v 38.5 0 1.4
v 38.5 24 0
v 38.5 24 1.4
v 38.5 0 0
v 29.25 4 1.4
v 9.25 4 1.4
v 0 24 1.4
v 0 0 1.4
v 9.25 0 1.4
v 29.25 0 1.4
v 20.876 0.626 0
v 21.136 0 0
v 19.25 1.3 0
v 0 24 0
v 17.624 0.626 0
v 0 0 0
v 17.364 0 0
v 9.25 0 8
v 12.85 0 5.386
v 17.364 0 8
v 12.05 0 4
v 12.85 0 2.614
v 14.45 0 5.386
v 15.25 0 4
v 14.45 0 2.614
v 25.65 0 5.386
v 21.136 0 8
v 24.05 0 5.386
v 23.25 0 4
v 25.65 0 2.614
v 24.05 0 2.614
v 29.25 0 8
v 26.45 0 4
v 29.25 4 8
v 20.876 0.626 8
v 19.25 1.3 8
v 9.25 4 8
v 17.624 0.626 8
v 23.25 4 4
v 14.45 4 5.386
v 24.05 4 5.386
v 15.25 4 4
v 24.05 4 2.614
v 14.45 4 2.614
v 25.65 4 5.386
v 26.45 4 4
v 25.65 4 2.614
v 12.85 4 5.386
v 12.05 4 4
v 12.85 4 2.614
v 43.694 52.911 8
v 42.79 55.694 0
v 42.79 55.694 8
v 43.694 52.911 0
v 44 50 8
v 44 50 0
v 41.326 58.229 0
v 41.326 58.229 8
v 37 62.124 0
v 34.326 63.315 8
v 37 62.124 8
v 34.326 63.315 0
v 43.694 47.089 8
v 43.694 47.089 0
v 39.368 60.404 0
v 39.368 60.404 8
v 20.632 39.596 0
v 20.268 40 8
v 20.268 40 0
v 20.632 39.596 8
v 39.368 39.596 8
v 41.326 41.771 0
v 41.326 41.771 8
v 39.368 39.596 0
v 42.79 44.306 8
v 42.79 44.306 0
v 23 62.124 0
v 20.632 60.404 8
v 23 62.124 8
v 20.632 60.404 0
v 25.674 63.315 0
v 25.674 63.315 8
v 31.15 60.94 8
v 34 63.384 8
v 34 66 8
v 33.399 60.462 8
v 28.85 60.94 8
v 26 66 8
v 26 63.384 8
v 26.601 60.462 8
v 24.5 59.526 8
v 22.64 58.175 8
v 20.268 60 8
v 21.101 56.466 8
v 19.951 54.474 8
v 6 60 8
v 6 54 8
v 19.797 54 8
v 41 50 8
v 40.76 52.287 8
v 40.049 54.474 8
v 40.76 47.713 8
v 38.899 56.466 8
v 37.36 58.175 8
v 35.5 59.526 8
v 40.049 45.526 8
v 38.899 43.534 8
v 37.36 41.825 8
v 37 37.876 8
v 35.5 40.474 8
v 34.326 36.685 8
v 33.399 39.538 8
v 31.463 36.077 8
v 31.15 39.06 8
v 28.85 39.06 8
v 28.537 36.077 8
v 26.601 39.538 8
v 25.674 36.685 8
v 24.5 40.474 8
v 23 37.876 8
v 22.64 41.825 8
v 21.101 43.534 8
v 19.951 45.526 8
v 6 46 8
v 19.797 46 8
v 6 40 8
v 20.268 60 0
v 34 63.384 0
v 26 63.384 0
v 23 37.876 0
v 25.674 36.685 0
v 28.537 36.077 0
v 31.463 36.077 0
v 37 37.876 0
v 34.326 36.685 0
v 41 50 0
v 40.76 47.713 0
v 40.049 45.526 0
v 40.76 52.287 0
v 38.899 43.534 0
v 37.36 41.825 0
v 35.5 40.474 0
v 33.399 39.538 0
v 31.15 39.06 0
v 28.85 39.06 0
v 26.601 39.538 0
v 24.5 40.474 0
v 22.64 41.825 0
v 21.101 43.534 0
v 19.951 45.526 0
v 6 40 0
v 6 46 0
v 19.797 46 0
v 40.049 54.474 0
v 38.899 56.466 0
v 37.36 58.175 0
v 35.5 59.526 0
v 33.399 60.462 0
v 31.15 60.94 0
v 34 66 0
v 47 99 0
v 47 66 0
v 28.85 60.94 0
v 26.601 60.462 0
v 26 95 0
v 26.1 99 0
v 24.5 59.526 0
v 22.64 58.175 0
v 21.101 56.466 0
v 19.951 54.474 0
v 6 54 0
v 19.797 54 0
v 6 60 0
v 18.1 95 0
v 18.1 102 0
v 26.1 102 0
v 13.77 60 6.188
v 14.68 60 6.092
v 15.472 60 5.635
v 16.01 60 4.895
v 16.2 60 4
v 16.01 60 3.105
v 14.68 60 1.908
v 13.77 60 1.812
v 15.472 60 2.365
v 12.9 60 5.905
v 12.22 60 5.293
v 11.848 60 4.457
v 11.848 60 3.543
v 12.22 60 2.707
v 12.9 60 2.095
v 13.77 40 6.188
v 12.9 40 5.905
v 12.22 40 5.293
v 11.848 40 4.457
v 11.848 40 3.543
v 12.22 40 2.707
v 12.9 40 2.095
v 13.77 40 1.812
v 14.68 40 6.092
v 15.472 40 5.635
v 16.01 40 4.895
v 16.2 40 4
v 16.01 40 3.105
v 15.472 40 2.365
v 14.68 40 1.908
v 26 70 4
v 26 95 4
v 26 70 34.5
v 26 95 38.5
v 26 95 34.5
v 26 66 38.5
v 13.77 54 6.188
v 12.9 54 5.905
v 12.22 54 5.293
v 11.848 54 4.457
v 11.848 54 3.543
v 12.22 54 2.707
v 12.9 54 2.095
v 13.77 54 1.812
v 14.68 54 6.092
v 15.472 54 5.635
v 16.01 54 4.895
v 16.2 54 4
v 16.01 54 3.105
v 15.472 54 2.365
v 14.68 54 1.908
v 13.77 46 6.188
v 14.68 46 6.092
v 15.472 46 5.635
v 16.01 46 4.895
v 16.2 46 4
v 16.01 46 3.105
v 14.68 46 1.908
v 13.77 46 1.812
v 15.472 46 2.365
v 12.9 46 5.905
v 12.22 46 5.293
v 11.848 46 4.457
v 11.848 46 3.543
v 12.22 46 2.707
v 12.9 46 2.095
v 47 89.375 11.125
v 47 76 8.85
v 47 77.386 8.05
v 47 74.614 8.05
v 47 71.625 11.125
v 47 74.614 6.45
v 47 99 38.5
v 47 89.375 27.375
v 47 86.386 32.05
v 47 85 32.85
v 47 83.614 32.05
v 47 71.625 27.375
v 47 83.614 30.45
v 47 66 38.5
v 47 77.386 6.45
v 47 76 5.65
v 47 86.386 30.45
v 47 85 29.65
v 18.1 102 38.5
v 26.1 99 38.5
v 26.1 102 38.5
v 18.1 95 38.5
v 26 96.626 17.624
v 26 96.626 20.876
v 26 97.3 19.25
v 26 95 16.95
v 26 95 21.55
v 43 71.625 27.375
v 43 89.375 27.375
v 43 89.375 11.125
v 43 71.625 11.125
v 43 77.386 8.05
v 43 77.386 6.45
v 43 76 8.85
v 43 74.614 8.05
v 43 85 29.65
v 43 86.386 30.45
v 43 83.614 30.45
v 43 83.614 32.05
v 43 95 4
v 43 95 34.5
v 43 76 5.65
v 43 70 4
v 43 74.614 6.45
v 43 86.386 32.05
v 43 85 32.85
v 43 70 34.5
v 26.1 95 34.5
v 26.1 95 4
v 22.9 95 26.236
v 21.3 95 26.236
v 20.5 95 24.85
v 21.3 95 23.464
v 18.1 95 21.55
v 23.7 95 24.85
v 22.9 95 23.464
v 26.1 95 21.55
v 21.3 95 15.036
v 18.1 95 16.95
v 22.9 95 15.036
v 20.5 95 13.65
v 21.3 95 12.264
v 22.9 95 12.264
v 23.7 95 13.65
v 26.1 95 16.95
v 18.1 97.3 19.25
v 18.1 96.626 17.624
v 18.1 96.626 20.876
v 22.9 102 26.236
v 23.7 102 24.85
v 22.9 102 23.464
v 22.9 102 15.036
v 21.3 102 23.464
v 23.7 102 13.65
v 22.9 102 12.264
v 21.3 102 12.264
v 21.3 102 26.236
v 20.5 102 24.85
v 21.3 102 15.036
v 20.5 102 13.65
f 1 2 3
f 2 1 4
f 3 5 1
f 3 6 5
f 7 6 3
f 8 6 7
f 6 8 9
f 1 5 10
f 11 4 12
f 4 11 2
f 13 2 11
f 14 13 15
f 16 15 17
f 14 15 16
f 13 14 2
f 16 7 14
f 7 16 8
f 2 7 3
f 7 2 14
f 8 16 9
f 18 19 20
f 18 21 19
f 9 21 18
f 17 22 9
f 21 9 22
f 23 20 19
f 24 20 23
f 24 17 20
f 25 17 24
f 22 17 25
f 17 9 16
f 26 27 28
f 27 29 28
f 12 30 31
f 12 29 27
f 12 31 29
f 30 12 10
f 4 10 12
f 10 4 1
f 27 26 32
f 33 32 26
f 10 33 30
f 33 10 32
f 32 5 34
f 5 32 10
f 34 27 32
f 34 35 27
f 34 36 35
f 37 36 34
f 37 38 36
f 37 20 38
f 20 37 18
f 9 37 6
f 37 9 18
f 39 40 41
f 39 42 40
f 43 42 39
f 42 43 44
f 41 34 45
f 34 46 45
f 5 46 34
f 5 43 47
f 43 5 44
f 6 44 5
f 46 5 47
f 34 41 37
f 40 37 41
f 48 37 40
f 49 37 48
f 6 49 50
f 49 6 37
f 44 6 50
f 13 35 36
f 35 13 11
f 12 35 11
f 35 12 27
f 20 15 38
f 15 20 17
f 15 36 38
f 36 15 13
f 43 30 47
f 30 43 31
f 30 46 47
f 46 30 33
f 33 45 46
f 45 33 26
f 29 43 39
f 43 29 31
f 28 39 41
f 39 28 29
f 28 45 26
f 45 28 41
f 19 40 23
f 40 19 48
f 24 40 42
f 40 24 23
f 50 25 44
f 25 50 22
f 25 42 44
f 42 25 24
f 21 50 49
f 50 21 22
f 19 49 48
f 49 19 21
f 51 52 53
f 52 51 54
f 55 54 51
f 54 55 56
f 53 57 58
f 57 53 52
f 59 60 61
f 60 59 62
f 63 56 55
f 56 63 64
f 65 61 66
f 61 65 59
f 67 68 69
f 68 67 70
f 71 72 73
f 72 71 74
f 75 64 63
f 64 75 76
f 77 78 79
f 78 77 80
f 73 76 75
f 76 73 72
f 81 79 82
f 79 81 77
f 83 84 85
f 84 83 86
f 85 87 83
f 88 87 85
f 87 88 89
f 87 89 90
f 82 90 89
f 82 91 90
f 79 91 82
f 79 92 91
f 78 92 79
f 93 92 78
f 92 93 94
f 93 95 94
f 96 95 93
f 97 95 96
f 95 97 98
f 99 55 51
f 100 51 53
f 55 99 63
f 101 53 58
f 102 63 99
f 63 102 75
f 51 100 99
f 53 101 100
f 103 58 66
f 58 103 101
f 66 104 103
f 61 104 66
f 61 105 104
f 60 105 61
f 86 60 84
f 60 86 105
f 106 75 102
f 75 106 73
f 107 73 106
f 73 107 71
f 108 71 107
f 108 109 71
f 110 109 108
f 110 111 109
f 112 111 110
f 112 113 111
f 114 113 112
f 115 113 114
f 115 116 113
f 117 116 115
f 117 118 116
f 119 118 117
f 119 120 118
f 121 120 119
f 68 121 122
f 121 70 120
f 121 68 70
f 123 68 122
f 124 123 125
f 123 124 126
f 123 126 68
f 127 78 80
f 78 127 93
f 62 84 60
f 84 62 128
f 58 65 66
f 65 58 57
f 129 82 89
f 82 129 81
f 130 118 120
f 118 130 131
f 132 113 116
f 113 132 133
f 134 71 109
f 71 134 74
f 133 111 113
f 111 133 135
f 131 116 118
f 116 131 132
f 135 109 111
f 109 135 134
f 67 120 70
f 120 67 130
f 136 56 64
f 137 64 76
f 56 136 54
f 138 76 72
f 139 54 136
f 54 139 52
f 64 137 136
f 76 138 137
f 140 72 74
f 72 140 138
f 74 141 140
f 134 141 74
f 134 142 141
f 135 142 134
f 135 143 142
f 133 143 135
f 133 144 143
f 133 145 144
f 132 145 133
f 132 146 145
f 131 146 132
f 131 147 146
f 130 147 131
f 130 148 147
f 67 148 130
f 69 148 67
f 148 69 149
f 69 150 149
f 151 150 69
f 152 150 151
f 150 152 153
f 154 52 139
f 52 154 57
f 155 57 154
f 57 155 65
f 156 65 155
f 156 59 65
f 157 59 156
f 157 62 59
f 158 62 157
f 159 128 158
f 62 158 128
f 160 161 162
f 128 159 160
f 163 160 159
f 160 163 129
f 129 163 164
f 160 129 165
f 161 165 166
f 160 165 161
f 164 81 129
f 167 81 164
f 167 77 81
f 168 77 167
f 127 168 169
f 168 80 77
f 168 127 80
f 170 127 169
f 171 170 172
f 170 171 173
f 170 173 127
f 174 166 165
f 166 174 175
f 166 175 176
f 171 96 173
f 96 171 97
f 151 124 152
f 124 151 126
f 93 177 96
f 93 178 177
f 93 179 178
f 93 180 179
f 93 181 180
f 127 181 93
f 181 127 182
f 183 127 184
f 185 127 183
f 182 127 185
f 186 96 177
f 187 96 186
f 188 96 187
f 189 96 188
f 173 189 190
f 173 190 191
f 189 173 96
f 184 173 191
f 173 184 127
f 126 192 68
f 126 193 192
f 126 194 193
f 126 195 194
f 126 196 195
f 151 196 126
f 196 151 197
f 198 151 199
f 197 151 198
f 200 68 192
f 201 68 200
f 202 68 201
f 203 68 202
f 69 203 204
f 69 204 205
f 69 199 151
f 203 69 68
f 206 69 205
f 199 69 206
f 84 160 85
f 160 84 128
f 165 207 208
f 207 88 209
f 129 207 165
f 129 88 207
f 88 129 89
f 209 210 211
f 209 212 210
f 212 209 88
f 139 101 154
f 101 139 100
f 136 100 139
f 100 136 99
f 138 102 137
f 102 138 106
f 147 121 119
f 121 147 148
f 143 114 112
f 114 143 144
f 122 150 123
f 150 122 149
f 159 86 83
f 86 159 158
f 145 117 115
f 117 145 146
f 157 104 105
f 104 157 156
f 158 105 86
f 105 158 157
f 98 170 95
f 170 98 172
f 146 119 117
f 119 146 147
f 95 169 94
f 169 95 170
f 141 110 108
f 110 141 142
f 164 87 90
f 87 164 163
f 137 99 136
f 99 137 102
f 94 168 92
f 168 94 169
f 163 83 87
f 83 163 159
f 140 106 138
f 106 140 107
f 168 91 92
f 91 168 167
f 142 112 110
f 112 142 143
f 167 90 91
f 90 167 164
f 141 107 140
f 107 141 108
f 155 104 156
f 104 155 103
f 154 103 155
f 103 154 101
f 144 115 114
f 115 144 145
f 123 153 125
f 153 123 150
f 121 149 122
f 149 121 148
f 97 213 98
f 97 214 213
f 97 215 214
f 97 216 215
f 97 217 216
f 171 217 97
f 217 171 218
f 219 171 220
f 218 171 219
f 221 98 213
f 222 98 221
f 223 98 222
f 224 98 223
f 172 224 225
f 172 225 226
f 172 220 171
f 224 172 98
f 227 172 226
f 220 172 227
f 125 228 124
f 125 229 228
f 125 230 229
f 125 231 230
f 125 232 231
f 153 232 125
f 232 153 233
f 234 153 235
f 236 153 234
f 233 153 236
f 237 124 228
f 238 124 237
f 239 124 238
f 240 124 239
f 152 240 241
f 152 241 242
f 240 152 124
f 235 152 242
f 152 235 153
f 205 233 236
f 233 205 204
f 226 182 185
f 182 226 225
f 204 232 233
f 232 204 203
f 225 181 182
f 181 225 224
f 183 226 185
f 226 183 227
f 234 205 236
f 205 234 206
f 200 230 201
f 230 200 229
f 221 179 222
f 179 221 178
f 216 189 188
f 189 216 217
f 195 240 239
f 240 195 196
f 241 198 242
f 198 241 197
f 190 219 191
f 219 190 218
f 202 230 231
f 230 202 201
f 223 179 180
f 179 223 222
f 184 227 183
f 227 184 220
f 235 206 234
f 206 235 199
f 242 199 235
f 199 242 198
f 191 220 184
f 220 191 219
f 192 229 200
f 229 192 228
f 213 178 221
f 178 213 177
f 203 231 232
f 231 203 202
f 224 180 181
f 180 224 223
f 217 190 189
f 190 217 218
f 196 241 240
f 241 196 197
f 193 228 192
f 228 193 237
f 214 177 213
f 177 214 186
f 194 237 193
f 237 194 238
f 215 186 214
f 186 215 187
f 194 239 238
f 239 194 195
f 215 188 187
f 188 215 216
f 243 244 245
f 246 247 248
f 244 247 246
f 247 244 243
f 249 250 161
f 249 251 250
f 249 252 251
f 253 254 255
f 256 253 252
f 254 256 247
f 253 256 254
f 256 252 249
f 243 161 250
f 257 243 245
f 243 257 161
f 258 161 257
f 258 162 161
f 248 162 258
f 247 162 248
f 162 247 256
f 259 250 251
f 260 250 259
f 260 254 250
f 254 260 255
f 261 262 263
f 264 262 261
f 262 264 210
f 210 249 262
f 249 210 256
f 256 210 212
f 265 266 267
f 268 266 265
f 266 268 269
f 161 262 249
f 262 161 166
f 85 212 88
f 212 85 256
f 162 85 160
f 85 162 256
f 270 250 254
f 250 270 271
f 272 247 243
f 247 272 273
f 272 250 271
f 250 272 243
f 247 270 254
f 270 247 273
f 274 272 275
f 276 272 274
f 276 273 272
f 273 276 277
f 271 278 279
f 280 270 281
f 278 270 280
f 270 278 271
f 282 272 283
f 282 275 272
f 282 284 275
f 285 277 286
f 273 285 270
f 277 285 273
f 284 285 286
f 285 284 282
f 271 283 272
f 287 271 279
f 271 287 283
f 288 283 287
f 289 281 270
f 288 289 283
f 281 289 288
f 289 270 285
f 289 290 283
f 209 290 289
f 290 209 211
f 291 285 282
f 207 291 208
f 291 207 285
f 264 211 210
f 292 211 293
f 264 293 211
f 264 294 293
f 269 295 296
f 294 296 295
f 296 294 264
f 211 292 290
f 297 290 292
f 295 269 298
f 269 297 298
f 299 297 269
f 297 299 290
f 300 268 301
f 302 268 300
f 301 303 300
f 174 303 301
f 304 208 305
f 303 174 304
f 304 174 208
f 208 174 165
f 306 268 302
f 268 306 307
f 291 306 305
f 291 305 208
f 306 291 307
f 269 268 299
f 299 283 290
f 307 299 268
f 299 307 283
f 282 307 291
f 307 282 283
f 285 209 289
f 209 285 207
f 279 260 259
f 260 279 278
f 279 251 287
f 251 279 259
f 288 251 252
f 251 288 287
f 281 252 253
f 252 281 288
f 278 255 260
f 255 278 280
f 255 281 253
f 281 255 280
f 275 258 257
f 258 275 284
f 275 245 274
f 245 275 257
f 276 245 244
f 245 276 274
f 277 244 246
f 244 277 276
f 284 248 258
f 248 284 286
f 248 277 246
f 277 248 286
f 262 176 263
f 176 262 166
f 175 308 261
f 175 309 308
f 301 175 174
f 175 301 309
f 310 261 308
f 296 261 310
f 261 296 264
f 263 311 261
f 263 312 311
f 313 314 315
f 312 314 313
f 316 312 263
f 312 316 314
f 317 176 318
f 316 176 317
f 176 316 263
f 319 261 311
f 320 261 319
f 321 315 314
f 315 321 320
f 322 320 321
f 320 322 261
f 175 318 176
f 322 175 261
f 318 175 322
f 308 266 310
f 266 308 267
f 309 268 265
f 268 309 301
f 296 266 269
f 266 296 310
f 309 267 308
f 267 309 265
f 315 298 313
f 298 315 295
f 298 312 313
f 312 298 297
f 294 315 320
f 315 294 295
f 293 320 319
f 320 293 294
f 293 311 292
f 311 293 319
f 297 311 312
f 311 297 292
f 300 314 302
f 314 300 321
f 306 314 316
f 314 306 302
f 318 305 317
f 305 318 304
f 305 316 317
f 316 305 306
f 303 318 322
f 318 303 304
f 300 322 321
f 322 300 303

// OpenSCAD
diam = 22;
cylh = 8;
gap = 8;
thickness =3;
thickness_strong = 6;
usb_l=15+2;
usb_h=17.75;
usb_h_outer=21;
usb_h_diff=(usb_h_outer-usb_h)/2;
usb_b=16.25;
usb_b_outer=30.5;
cable_gap=4;
module usb_socket()
{
   union() {
     difference() {
       cube([usb_l+4,usb_h_outer+cable_gap+8,usb_b_outer+8]);
       translate(v=[0,4+usb_h_diff,(usb_b_outer-usb_b)/2+4]) cube([usb_l+4,usb_h,usb_b]);
       translate(v=[0,4,4]) cube([usb_l,usb_h_outer+cable_gap,usb_b_outer]);
       translate(v=[usb_l-1,4+9+6,4+usb_b_outer-(30.5-24)/2]) rotate([0,90,0]) cylinder(r=1.6,h=4+2);
       translate(v=[usb_l-1,4+6,4+(30.5-24)/2]) rotate([0,90,0]) cylinder(r=1.6,h=4+2);
 
    }
    /* translate(v=[usb_l-6,usb_h+4,0])
    cube([6,cable_gap+3,usb_b+8]); */
    difference() {
      translate(v=[-7.9,usb_h_outer+cable_gap+4,0]) cube([8,7,usb_b_outer+8]);
      translate(v=[-7.9,usb_h_outer+cable_gap+4,usb_b_outer/2+4]) rotate([0,90,0]) cylinder(r=2.3,h=10);
      translate(v=[-7.9+4,usb_h_outer+cable_gap+4-0.1,usb_b_outer/2+4+4+1.6]) rotate([-90,0,0]) cylinder(r=1.6,h=20);
      translate(v=[-7.9+4,usb_h_outer+cable_gap+4-0.1,usb_b_outer/2+4-4-1.6]) rotate([-90,0,0]) cylinder(r=1.6,h=20);
    }
   }
}

module usb_holder() {
union() {
difference() {
union() {
cylinder(r=(diam/2)+thickness, h=cylh);
translate(v=[-diam/2-10-thickness,-gap/2-thickness_strong,0])
cube([30,gap+2*thickness_strong,cylh]);
translate(v=[-cylh/2,0,0])
cube([cylh,diam/2+7,cylh]);
}
cylinder(r=diam/2, h=cylh);
translate(v=[-diam/2-10-thickness,-gap/2,0])
cube([30,gap,cylh]);
translate(v=[-diam/2-5,-gap/2-thickness_strong,cylh/2])
rotate([-90,0,0]) cylinder(r=2.2, h=gap+thickness_strong*2, $fn=15);
}
translate([-cylh/2,diam/2+5,0])
 usb_socket();
}
}

module klemme()
{
  difference() {
  union() {
    cube([usb_b_outer+8,usb_h_outer+3,1.4]);
    translate(v=[usb_b_outer/2+4-4-6,0]) cube([4+6+4+6,4,8]);
    translate(v=[usb_b_outer/2+4,0,0]) cylinder(r=4,h=8);
  } 
  translate(v=[usb_b_outer/2+4,-1,0]) cylinder(r=2.3,h=8);
  translate(v=[usb_b_outer/2+4+4+1.6,0,4]) rotate([-90,0,0]) cylinder(r=1.6,h=20);
  translate(v=[usb_b_outer/2+4-4-1.6,0,4]) rotate([-90,0,0]) cylinder(r=1.6,h=20);
  translate(v=[0,-10,0]) cube([usb_b_outer+8,10,20]);
  }
}

/* print with something hard */
klemme();

/* used soft pla for that */
translate(v=[30,50,0])
usb_holder();
/*
 projection() rotate([0,90,0]) intersection() {
 translate(v=[18,0,0]) cube([0.5,50,50]);
usb_holder();

}
 projection() {translate(v=[44,0,0])  rotate([0,90,0]) intersection() {
 translate(v=[14.2,0,0]) cube([0.5,50,50]);
usb_holder();

}
}
*/
